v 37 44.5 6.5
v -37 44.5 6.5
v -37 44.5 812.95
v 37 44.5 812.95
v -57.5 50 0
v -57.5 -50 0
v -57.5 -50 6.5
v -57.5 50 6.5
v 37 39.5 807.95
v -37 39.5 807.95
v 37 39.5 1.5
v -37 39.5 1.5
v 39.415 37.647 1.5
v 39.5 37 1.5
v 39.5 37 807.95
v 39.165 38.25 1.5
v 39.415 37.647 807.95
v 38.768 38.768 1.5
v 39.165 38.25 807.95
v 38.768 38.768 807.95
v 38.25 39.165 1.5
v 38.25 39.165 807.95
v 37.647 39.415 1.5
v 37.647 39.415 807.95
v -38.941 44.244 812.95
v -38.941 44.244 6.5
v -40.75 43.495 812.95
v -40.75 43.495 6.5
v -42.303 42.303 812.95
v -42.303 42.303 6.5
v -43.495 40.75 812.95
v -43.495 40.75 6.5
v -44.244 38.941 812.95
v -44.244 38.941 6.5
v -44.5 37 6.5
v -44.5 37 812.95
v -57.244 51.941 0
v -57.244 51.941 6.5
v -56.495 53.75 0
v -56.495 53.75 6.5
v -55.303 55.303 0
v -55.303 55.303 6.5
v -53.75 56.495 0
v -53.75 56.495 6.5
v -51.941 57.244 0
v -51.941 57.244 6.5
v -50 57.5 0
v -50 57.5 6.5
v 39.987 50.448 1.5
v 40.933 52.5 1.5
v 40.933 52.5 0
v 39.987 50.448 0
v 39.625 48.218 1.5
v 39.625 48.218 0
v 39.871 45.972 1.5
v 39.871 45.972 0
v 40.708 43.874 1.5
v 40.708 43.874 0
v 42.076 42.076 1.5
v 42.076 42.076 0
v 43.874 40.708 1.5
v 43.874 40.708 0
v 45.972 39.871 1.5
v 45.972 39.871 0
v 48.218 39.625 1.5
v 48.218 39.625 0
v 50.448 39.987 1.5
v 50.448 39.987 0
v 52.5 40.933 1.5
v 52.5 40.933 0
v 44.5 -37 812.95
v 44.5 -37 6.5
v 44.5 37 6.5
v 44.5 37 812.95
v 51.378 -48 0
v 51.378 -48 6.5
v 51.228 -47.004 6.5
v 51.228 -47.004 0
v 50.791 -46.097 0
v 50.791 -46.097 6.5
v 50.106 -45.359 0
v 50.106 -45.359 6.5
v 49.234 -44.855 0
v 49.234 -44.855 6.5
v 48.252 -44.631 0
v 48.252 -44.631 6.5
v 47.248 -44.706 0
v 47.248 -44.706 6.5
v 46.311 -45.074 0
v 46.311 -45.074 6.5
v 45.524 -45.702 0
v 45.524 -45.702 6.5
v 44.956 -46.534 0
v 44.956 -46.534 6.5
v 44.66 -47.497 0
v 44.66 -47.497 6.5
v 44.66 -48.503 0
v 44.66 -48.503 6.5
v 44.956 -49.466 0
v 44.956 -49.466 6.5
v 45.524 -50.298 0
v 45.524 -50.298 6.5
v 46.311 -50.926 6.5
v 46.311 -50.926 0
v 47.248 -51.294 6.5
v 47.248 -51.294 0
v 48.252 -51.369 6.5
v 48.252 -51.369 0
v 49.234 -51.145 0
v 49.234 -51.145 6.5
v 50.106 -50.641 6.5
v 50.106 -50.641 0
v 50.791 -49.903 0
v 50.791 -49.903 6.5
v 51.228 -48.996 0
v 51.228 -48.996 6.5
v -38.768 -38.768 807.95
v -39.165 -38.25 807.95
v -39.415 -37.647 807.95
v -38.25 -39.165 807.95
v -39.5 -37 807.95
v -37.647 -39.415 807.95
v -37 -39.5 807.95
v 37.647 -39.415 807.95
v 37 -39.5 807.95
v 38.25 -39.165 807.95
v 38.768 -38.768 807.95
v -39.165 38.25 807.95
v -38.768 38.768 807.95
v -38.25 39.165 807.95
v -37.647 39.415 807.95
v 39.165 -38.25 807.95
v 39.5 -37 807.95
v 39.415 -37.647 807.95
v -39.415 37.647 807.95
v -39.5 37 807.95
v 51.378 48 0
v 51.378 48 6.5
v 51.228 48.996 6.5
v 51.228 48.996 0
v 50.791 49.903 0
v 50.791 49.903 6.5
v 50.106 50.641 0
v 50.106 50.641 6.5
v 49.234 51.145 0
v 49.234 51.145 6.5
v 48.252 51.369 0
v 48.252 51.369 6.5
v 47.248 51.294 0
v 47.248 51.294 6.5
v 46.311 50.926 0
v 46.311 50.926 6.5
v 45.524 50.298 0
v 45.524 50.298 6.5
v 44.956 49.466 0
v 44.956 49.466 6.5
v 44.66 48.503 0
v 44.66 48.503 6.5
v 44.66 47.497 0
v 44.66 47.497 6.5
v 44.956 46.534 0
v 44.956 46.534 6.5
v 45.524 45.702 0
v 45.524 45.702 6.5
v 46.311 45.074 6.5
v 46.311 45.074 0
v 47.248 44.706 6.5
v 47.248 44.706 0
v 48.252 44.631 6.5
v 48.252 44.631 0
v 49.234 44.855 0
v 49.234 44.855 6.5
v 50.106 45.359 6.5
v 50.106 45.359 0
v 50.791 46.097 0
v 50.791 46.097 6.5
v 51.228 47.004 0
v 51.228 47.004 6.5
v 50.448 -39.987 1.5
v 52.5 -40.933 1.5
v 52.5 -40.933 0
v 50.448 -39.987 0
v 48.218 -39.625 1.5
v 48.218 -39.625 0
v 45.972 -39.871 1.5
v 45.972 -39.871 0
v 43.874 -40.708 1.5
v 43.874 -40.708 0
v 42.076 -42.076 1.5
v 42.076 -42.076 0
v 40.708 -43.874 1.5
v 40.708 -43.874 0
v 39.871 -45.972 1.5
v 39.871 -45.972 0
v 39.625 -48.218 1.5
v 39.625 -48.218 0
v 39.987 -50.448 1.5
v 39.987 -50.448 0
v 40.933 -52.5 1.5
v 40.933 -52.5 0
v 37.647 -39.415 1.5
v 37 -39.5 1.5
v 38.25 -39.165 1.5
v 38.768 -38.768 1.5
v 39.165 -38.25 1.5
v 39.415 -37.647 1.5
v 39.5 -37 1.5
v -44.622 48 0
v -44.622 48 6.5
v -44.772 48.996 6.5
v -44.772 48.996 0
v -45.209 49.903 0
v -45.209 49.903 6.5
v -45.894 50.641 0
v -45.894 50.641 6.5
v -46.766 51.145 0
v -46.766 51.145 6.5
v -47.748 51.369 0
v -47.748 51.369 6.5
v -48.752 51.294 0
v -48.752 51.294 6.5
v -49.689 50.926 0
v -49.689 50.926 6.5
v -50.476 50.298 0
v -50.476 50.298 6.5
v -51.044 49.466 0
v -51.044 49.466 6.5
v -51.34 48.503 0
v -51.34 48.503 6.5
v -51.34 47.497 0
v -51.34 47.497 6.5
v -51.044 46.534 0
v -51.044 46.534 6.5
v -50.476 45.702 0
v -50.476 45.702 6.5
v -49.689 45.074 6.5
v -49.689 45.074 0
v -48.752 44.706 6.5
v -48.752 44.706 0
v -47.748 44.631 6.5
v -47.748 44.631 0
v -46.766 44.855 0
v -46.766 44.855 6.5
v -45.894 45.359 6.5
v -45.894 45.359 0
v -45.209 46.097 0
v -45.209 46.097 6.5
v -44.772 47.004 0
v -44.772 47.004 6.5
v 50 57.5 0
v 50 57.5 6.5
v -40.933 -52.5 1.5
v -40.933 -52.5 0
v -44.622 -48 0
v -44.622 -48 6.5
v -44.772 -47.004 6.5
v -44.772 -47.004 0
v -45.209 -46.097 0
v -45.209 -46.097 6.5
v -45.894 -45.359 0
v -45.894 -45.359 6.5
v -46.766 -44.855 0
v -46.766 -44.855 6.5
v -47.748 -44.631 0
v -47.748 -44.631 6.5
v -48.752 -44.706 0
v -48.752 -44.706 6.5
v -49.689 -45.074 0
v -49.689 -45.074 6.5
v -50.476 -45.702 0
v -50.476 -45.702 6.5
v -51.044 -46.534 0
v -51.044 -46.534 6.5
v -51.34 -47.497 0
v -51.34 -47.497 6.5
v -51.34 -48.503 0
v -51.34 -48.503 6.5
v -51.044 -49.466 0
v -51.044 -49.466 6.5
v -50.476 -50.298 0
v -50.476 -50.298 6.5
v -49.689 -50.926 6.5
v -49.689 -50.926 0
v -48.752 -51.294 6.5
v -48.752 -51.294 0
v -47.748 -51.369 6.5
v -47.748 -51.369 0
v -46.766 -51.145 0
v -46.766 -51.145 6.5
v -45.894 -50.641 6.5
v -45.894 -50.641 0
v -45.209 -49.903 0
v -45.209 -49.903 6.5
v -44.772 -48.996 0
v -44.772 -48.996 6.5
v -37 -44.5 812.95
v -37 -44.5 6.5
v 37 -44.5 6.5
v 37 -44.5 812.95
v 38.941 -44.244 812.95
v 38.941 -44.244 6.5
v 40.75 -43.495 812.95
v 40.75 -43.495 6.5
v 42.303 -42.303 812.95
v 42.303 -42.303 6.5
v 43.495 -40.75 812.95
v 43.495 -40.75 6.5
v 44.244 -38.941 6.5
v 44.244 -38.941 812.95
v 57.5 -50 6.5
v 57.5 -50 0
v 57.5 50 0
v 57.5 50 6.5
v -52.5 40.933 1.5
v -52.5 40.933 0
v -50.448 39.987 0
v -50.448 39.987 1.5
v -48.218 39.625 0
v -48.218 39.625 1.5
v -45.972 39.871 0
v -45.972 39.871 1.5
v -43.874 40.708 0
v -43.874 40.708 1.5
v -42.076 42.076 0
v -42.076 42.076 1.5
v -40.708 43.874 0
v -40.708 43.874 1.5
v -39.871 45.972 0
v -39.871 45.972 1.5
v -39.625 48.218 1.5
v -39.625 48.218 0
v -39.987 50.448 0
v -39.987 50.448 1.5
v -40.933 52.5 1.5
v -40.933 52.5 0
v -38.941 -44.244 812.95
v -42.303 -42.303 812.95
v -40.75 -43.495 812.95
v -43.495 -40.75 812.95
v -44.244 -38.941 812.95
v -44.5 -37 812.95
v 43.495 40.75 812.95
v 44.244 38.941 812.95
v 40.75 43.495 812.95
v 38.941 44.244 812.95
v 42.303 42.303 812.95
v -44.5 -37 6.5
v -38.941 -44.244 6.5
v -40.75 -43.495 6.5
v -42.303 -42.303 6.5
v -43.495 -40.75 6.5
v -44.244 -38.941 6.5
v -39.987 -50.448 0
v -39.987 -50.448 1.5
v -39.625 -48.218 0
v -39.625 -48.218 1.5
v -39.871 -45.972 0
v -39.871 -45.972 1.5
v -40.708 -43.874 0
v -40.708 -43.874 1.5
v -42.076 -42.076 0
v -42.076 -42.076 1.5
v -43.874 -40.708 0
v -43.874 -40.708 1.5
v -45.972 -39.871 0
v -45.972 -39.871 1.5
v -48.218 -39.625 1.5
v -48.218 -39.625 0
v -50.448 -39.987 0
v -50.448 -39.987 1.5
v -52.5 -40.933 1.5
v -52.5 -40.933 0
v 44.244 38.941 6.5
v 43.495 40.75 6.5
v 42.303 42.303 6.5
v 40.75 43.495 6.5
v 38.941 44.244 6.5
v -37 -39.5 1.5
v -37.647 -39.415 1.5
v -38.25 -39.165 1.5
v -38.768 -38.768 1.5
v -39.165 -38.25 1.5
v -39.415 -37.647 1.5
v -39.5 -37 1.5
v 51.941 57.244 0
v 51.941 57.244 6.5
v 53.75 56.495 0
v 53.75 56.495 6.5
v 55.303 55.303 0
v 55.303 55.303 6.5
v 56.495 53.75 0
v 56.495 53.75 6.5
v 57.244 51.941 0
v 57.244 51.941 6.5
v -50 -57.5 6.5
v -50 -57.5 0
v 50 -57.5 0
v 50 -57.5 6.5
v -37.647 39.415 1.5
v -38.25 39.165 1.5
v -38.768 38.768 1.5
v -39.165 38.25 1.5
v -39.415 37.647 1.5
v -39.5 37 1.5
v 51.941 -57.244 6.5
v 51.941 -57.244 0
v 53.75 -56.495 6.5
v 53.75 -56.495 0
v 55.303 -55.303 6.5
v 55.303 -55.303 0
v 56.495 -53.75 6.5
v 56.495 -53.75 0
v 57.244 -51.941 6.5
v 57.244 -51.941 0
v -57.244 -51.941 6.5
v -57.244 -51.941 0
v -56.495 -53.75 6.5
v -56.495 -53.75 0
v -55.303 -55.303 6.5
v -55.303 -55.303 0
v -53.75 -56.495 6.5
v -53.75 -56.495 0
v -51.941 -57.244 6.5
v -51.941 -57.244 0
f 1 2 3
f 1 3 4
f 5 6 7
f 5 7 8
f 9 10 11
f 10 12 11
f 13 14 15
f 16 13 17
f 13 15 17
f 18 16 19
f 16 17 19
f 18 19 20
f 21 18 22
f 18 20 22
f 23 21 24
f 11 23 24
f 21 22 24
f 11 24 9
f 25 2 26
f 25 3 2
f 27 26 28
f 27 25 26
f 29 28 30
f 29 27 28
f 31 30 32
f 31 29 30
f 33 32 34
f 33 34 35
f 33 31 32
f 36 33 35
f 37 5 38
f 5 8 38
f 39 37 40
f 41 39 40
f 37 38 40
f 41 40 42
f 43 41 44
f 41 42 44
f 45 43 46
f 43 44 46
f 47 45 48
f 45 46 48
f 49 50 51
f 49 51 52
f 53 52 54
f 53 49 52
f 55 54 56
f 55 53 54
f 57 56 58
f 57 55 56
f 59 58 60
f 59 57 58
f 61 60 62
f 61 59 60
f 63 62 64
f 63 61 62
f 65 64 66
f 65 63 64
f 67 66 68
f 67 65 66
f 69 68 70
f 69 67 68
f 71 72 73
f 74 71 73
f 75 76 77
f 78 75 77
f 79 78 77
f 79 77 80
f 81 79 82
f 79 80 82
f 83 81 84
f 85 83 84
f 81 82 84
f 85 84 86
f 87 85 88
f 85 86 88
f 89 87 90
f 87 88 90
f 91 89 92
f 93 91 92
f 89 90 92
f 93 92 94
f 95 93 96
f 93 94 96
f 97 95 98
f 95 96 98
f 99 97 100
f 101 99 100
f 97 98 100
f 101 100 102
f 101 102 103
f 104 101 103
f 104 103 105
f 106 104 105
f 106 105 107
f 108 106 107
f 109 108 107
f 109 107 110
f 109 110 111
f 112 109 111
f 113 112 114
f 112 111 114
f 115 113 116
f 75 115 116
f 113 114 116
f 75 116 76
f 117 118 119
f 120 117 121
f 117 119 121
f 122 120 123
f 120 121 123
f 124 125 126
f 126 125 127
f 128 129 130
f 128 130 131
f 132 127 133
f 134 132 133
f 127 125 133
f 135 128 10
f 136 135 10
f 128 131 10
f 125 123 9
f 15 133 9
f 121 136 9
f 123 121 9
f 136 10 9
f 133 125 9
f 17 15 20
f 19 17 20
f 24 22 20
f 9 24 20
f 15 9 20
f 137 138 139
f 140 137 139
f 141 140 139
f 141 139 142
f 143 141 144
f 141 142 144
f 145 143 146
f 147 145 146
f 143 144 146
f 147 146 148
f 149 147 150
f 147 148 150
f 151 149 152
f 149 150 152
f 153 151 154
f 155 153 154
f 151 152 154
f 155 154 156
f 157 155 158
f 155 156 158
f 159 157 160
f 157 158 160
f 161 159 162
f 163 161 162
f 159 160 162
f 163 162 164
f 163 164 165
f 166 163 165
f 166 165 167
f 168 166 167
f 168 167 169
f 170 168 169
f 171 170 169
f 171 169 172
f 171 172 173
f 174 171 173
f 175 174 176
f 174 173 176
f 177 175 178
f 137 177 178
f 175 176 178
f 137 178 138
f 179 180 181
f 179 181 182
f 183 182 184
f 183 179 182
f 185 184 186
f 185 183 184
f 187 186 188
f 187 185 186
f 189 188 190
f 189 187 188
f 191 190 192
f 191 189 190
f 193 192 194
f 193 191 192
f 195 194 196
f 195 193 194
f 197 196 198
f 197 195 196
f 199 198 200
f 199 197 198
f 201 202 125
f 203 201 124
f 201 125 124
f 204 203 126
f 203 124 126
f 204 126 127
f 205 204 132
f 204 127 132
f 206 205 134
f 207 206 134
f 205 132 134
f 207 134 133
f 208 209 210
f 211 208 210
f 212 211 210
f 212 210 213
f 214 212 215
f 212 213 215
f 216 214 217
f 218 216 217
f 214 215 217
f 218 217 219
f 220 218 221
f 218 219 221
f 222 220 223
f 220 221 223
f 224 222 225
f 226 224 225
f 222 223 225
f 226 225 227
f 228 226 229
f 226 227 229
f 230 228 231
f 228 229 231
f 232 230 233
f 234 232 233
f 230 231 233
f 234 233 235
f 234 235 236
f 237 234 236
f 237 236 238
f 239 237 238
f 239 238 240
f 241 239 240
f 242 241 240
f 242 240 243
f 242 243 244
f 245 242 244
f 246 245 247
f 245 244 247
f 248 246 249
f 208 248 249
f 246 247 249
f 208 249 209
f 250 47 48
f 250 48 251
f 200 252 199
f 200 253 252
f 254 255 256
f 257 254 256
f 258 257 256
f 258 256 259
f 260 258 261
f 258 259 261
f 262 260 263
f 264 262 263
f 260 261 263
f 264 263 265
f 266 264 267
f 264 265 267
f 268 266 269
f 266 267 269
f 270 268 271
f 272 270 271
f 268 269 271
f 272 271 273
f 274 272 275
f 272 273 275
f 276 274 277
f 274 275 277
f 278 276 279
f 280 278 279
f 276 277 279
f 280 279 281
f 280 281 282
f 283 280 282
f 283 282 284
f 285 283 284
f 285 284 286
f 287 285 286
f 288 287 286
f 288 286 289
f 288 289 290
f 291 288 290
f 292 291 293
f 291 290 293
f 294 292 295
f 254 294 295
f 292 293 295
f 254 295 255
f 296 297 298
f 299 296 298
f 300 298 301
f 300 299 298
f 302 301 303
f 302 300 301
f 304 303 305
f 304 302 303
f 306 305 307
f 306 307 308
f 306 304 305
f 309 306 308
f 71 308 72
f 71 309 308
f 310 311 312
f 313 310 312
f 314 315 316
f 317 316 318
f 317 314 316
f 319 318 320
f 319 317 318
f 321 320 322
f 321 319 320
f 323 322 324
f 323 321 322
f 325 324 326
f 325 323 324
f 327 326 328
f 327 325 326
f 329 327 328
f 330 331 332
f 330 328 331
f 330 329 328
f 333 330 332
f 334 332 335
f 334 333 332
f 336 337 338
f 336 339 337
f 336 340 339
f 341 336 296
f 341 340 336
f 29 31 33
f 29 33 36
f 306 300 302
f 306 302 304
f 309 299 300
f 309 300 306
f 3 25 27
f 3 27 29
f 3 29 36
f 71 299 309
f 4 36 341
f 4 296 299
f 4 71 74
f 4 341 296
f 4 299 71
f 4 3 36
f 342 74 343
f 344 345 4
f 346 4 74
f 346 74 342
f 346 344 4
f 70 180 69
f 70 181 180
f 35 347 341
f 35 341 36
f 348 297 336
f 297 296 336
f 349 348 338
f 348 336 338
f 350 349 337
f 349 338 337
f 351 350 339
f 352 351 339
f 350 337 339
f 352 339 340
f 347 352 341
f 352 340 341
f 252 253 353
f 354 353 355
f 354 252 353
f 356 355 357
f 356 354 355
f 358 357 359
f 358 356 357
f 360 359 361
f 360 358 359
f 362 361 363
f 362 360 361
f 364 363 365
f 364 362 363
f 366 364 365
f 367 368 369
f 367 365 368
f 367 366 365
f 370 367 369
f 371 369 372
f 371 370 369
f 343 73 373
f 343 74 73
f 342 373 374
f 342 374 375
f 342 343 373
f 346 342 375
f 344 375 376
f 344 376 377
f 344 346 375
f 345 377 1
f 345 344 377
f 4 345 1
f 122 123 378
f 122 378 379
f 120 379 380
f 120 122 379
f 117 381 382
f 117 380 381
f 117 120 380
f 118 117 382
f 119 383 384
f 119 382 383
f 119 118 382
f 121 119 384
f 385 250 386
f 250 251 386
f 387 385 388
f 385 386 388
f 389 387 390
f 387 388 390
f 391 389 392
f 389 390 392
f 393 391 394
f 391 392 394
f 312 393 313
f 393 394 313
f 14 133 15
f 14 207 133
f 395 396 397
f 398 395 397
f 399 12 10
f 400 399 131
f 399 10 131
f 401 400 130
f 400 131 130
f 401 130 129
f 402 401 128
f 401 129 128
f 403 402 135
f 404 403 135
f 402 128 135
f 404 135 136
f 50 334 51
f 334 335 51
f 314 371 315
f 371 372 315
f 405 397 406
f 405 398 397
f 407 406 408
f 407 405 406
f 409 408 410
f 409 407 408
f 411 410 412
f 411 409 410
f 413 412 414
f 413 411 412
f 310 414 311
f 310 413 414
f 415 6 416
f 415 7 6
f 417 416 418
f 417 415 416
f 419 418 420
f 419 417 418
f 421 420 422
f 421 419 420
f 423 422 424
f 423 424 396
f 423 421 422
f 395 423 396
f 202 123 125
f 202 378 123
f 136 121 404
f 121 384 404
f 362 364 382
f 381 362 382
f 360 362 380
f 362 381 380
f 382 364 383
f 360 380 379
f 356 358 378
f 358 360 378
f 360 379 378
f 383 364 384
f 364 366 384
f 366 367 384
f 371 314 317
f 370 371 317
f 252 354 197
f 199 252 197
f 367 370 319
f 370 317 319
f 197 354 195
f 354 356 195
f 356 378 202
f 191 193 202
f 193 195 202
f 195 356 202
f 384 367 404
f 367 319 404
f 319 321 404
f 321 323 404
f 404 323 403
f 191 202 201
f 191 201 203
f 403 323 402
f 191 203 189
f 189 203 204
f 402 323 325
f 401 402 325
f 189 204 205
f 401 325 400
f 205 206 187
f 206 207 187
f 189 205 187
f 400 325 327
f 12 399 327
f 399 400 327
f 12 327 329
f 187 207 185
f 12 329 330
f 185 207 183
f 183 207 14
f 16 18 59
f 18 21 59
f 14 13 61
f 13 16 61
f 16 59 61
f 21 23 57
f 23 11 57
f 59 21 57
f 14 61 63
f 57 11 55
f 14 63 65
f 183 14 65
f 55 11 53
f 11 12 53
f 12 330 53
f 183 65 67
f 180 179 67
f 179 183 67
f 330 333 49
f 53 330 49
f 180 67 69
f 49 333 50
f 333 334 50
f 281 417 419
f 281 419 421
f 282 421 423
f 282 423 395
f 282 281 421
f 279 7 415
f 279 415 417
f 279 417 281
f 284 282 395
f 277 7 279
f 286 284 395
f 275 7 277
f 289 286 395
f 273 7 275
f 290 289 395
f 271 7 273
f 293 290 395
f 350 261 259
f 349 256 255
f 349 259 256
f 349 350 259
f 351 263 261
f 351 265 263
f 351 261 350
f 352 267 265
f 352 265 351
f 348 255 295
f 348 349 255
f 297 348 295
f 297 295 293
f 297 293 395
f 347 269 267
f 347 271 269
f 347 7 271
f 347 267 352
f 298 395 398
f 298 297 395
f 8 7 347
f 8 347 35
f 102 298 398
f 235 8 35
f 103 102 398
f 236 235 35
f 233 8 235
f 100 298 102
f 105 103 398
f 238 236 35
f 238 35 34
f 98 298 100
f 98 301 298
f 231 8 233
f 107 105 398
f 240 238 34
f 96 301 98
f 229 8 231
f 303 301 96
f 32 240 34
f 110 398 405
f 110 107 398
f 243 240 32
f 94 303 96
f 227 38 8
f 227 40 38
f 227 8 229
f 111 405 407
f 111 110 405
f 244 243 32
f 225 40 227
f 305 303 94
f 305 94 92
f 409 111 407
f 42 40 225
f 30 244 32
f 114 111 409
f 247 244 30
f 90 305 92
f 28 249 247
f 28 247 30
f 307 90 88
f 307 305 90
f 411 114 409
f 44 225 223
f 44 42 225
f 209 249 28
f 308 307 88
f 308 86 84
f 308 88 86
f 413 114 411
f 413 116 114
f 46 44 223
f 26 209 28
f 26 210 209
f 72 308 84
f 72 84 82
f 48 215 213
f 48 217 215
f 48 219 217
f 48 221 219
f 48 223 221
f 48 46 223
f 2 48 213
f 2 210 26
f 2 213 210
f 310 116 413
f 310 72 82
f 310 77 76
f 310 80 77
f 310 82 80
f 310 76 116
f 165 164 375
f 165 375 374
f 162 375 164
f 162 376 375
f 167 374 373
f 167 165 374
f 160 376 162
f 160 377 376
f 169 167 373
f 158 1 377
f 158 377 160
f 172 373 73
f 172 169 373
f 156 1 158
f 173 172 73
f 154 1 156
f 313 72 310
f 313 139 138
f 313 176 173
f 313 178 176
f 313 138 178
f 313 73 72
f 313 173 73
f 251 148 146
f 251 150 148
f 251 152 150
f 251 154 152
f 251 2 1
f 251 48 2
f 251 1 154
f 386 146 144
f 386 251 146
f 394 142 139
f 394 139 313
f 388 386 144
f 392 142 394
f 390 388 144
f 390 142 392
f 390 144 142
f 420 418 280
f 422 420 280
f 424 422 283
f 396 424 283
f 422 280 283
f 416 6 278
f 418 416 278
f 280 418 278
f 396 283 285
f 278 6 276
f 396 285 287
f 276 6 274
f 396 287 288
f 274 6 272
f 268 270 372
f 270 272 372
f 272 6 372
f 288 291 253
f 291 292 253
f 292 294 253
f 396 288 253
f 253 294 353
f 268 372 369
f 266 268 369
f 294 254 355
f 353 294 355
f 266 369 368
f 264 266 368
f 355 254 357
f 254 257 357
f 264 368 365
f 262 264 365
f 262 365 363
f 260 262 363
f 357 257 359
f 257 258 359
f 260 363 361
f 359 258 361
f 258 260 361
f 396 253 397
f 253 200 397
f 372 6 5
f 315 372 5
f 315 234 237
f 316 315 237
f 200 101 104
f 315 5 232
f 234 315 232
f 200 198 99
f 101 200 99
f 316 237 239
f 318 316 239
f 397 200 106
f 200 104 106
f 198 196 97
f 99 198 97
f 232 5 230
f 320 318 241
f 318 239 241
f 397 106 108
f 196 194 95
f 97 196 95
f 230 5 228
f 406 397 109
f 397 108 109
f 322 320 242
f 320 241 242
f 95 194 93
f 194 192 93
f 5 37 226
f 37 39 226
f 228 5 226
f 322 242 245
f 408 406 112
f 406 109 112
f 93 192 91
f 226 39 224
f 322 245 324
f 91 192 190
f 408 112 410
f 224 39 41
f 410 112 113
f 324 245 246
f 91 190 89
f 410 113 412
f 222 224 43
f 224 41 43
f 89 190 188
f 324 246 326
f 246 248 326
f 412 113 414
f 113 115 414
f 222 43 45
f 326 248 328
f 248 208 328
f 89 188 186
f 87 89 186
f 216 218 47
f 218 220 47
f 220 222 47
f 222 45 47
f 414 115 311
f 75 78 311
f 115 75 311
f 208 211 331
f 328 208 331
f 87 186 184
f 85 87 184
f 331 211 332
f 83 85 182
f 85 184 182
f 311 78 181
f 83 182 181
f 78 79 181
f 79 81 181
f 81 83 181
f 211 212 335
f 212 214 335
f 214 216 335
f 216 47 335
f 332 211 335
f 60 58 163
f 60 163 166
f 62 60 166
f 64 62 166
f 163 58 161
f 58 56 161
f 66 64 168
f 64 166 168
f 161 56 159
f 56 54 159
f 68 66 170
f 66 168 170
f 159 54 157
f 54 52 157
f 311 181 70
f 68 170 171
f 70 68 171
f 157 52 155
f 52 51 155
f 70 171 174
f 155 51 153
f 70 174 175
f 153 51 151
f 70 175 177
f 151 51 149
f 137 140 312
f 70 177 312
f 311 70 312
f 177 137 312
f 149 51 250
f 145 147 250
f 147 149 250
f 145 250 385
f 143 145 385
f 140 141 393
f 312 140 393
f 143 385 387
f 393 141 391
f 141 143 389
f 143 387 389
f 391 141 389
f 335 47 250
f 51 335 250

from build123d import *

# Parameters (mm, degrees)
SKETCH1_W           = 115
SKETCH1_H           = 115
BOSS_EXTRUDE1_DEPTH = 6.5
SKETCH2_W           = 89
SKETCH2_H           = 89
BOSS_EXTRUDE2_DEPTH = 806.45
FILLET1_R           = 7.5
SKETCH3_R           = 3.3782
CUT_EXTRUDE1_DEPTH  = 6.5
SHELL1_T            = -5


with BuildPart() as part:
    # Sketch1 → Boss-Extrude1 (new body)
    with BuildSketch(Plane.XY):
        Rectangle(SKETCH1_W, SKETCH1_H)
    extrude(amount=BOSS_EXTRUDE1_DEPTH)

    # Sketch2 → Boss-Extrude2 (add)
    with BuildSketch(Plane.XY.offset(6.5)):
        Rectangle(SKETCH2_W, SKETCH2_H)
    extrude(amount=BOSS_EXTRUDE2_DEPTH)

    # Fillet1
    fillet1_edges = [part.edges().sort_by_distance(p)[0] for p in [
        (44.5, -44.5, 409.725),
        (44.5, 44.5, 409.725),
        (-44.5, 44.5, 409.725),
        (-44.5, -44.5, 409.725),
        (57.5, -57.5, 3.25),
        (-57.5, -57.5, 3.25),
        (-57.5, 57.5, 3.25),
        (57.5, 57.5, 3.25),
    ]]
    fillet(fillet1_edges, radius=FILLET1_R)

    # Sketch3 → Cut-Extrude1 (cut)
    with BuildSketch(Plane.XY.offset(6.5)):
        with Locations((48, -48)):
            Circle(SKETCH3_R)
        with Locations((-48, 48)):
            Circle(SKETCH3_R)
        with Locations((48, 48)):
            Circle(SKETCH3_R)
        with Locations((-48, -48)):
            Circle(SKETCH3_R)
    extrude(amount=-CUT_EXTRUDE1_DEPTH, mode=Mode.SUBTRACT)

    # Shell1
    shell1_openings = [part.faces().sort_by_distance(p)[0] for p in [
        (-51.3782, -48, 0),
    ]]
    offset(amount=SHELL1_T, openings=shell1_openings, kind=Kind.INTERSECTION)


solid = part.part
